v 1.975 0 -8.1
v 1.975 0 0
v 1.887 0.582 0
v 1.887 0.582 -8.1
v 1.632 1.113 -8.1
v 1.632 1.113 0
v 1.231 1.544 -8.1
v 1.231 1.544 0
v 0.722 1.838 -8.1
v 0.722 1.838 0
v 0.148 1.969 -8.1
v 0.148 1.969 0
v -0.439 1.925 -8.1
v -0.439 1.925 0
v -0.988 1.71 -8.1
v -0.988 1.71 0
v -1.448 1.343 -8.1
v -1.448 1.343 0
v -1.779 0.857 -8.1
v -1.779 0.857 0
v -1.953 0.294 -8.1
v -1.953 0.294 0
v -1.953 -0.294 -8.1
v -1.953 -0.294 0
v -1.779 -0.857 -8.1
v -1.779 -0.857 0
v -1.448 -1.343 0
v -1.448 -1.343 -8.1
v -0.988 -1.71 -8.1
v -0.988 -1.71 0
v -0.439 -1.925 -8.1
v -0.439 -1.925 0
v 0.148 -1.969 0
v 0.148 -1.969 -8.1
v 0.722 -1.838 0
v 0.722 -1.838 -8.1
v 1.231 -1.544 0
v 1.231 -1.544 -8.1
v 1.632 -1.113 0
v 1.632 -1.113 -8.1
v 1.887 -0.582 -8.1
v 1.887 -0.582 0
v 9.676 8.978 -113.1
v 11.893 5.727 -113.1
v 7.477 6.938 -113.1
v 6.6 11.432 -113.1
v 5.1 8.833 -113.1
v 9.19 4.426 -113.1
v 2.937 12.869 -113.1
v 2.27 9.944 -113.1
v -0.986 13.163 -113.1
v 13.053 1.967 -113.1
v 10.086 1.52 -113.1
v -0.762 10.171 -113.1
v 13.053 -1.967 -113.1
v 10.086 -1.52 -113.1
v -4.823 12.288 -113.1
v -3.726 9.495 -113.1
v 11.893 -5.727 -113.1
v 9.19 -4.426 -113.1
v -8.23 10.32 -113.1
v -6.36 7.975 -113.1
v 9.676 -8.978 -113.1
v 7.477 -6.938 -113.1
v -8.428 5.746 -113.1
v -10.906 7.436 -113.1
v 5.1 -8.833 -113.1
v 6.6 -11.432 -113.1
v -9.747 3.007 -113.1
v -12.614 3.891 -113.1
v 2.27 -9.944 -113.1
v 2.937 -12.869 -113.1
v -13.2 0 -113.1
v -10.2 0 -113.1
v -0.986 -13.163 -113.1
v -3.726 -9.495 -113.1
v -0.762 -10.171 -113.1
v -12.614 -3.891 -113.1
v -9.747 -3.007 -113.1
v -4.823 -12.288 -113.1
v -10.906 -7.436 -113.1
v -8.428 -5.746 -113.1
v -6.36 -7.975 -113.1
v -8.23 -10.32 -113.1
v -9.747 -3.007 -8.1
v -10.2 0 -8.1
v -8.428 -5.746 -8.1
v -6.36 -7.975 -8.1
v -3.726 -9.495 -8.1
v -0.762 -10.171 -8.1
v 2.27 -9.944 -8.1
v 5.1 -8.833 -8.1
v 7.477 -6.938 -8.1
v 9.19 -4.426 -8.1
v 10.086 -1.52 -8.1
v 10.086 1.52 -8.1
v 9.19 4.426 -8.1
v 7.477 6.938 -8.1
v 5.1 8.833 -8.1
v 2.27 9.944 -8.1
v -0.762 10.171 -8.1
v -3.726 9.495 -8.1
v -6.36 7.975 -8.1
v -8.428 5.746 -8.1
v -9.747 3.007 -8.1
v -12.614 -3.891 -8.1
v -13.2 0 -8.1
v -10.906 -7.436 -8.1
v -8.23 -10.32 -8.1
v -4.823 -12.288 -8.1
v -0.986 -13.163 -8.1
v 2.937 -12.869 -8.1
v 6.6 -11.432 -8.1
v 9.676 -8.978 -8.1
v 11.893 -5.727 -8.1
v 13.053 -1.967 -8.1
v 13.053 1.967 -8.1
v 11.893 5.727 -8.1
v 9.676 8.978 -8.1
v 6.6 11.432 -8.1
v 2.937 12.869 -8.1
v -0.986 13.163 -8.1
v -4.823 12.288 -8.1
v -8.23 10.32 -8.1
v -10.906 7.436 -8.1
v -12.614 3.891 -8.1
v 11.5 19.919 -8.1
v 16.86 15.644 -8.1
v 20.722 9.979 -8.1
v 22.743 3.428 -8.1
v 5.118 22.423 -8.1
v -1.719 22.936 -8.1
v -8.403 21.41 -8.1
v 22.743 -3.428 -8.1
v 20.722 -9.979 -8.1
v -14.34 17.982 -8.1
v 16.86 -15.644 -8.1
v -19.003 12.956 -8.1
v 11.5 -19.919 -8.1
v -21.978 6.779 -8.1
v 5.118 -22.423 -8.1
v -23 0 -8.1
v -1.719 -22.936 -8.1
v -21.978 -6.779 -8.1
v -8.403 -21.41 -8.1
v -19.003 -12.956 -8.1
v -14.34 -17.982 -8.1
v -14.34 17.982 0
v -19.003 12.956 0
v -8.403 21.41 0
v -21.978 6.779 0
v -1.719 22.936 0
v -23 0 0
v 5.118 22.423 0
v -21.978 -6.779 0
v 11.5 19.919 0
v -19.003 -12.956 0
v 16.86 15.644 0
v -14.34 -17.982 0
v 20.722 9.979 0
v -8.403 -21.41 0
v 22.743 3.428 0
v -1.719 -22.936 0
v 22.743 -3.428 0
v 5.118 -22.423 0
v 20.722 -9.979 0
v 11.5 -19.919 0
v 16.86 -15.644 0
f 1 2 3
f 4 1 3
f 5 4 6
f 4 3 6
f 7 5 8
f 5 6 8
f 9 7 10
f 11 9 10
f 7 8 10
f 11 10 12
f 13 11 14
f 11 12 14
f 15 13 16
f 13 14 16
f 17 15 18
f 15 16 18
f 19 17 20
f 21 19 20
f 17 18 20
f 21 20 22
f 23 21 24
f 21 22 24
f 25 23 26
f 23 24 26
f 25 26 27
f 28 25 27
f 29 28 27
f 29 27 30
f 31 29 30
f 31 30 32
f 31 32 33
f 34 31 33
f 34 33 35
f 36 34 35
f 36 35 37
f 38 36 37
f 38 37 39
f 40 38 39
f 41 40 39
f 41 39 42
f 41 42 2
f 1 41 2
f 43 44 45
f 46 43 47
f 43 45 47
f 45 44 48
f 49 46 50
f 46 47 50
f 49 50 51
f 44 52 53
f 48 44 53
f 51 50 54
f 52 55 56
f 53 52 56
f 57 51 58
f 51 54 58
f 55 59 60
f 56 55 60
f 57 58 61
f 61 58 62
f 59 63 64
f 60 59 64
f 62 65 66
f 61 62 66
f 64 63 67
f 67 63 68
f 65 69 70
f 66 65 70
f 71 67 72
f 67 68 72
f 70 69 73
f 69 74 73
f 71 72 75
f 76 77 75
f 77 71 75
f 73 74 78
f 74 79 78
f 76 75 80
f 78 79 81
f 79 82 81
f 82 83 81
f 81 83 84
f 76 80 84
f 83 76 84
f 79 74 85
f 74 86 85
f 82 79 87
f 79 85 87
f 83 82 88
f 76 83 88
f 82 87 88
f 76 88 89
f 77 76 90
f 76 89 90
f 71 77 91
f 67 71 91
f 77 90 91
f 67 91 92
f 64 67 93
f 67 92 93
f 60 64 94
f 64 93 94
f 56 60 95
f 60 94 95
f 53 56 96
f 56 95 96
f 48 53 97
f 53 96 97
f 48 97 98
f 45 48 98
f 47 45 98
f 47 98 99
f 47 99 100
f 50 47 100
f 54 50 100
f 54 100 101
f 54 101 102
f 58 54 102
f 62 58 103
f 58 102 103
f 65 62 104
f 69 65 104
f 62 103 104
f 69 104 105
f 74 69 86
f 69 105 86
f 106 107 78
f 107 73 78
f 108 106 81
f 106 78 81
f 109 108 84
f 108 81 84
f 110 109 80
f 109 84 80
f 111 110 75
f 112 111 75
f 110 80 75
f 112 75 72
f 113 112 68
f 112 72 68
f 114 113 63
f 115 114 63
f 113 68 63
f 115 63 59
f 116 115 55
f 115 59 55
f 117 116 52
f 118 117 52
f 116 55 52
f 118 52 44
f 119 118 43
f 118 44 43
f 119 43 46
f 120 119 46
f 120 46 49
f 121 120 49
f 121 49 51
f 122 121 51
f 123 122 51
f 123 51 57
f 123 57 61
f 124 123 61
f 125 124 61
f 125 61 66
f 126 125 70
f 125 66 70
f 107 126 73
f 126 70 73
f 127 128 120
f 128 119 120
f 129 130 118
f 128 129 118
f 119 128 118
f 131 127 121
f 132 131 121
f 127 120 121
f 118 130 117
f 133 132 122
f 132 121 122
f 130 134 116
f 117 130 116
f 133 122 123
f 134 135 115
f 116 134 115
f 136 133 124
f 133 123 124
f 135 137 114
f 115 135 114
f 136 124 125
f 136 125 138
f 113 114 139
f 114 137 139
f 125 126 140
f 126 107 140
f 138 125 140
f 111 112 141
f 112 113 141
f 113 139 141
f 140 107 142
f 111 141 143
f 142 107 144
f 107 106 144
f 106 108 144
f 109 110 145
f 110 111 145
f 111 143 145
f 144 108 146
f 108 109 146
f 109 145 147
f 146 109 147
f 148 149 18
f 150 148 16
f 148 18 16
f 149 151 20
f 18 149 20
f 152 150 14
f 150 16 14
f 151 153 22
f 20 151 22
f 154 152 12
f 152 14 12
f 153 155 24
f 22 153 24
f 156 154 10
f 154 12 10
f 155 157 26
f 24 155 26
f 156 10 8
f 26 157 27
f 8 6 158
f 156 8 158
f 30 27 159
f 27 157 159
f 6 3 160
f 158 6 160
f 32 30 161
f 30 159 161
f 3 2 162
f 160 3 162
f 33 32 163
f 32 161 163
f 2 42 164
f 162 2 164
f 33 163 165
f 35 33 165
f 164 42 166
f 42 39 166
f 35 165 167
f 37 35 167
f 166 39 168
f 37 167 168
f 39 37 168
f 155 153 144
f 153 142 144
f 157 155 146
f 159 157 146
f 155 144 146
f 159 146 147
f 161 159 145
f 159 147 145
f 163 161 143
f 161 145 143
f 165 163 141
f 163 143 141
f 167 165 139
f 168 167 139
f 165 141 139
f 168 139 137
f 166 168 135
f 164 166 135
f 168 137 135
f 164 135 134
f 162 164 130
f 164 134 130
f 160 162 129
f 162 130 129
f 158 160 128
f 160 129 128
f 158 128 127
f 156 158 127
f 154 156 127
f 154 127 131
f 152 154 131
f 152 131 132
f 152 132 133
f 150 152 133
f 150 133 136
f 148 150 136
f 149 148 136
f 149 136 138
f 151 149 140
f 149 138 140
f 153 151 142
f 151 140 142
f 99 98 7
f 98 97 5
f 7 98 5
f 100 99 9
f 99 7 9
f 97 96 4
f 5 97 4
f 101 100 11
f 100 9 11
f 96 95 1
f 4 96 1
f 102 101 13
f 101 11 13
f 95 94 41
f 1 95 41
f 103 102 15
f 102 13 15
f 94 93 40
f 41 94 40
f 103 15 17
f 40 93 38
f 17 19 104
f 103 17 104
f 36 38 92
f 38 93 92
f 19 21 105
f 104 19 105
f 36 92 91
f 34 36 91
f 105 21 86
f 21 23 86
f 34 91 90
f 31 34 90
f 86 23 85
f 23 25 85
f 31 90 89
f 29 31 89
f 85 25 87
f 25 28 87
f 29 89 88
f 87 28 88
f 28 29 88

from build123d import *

# Parameters (mm, degrees)
CUT_EXTRUDE1_REACH = 119.684
SKETCH2_R          = 1.975


with BuildPart() as part:
    # Sketch1 → Revolve1 (revolve)
    with BuildSketch(Plane(origin=(0, 0, 0), x_dir=(1, 0, 0), z_dir=(0, 1, 0)), mode=Mode.PRIVATE) as revolve1_sk:
        Polygon((0, 0), (23, 0), (23, 8.1), (13.2, 8.1), (13.2, 113.1), (10.2, 113.1), (10.2, 8.1), (0, 8.1), align=None)
    revolve(revolve1_sk.sketch.rotate(Axis((0, 0, -8.1), (0, 0, 1)), 180), axis=Axis((0, 0, -8.1), (0, 0, 1)))

    # Sketch2 → Cut-Extrude1 (cut, up to next)
    with BuildSketch(Plane.XY, mode=Mode.PRIVATE) as cut_extrude1_sk1:
        Circle(SKETCH2_R)
    cut_extrude1_tool1 = extrude(cut_extrude1_sk1.sketch, amount=-CUT_EXTRUDE1_REACH, mode=Mode.PRIVATE) & part.part
    add(cut_extrude1_tool1.solids().sort_by_distance((0, 0, 0))[0], mode=Mode.SUBTRACT)


solid = part.part
